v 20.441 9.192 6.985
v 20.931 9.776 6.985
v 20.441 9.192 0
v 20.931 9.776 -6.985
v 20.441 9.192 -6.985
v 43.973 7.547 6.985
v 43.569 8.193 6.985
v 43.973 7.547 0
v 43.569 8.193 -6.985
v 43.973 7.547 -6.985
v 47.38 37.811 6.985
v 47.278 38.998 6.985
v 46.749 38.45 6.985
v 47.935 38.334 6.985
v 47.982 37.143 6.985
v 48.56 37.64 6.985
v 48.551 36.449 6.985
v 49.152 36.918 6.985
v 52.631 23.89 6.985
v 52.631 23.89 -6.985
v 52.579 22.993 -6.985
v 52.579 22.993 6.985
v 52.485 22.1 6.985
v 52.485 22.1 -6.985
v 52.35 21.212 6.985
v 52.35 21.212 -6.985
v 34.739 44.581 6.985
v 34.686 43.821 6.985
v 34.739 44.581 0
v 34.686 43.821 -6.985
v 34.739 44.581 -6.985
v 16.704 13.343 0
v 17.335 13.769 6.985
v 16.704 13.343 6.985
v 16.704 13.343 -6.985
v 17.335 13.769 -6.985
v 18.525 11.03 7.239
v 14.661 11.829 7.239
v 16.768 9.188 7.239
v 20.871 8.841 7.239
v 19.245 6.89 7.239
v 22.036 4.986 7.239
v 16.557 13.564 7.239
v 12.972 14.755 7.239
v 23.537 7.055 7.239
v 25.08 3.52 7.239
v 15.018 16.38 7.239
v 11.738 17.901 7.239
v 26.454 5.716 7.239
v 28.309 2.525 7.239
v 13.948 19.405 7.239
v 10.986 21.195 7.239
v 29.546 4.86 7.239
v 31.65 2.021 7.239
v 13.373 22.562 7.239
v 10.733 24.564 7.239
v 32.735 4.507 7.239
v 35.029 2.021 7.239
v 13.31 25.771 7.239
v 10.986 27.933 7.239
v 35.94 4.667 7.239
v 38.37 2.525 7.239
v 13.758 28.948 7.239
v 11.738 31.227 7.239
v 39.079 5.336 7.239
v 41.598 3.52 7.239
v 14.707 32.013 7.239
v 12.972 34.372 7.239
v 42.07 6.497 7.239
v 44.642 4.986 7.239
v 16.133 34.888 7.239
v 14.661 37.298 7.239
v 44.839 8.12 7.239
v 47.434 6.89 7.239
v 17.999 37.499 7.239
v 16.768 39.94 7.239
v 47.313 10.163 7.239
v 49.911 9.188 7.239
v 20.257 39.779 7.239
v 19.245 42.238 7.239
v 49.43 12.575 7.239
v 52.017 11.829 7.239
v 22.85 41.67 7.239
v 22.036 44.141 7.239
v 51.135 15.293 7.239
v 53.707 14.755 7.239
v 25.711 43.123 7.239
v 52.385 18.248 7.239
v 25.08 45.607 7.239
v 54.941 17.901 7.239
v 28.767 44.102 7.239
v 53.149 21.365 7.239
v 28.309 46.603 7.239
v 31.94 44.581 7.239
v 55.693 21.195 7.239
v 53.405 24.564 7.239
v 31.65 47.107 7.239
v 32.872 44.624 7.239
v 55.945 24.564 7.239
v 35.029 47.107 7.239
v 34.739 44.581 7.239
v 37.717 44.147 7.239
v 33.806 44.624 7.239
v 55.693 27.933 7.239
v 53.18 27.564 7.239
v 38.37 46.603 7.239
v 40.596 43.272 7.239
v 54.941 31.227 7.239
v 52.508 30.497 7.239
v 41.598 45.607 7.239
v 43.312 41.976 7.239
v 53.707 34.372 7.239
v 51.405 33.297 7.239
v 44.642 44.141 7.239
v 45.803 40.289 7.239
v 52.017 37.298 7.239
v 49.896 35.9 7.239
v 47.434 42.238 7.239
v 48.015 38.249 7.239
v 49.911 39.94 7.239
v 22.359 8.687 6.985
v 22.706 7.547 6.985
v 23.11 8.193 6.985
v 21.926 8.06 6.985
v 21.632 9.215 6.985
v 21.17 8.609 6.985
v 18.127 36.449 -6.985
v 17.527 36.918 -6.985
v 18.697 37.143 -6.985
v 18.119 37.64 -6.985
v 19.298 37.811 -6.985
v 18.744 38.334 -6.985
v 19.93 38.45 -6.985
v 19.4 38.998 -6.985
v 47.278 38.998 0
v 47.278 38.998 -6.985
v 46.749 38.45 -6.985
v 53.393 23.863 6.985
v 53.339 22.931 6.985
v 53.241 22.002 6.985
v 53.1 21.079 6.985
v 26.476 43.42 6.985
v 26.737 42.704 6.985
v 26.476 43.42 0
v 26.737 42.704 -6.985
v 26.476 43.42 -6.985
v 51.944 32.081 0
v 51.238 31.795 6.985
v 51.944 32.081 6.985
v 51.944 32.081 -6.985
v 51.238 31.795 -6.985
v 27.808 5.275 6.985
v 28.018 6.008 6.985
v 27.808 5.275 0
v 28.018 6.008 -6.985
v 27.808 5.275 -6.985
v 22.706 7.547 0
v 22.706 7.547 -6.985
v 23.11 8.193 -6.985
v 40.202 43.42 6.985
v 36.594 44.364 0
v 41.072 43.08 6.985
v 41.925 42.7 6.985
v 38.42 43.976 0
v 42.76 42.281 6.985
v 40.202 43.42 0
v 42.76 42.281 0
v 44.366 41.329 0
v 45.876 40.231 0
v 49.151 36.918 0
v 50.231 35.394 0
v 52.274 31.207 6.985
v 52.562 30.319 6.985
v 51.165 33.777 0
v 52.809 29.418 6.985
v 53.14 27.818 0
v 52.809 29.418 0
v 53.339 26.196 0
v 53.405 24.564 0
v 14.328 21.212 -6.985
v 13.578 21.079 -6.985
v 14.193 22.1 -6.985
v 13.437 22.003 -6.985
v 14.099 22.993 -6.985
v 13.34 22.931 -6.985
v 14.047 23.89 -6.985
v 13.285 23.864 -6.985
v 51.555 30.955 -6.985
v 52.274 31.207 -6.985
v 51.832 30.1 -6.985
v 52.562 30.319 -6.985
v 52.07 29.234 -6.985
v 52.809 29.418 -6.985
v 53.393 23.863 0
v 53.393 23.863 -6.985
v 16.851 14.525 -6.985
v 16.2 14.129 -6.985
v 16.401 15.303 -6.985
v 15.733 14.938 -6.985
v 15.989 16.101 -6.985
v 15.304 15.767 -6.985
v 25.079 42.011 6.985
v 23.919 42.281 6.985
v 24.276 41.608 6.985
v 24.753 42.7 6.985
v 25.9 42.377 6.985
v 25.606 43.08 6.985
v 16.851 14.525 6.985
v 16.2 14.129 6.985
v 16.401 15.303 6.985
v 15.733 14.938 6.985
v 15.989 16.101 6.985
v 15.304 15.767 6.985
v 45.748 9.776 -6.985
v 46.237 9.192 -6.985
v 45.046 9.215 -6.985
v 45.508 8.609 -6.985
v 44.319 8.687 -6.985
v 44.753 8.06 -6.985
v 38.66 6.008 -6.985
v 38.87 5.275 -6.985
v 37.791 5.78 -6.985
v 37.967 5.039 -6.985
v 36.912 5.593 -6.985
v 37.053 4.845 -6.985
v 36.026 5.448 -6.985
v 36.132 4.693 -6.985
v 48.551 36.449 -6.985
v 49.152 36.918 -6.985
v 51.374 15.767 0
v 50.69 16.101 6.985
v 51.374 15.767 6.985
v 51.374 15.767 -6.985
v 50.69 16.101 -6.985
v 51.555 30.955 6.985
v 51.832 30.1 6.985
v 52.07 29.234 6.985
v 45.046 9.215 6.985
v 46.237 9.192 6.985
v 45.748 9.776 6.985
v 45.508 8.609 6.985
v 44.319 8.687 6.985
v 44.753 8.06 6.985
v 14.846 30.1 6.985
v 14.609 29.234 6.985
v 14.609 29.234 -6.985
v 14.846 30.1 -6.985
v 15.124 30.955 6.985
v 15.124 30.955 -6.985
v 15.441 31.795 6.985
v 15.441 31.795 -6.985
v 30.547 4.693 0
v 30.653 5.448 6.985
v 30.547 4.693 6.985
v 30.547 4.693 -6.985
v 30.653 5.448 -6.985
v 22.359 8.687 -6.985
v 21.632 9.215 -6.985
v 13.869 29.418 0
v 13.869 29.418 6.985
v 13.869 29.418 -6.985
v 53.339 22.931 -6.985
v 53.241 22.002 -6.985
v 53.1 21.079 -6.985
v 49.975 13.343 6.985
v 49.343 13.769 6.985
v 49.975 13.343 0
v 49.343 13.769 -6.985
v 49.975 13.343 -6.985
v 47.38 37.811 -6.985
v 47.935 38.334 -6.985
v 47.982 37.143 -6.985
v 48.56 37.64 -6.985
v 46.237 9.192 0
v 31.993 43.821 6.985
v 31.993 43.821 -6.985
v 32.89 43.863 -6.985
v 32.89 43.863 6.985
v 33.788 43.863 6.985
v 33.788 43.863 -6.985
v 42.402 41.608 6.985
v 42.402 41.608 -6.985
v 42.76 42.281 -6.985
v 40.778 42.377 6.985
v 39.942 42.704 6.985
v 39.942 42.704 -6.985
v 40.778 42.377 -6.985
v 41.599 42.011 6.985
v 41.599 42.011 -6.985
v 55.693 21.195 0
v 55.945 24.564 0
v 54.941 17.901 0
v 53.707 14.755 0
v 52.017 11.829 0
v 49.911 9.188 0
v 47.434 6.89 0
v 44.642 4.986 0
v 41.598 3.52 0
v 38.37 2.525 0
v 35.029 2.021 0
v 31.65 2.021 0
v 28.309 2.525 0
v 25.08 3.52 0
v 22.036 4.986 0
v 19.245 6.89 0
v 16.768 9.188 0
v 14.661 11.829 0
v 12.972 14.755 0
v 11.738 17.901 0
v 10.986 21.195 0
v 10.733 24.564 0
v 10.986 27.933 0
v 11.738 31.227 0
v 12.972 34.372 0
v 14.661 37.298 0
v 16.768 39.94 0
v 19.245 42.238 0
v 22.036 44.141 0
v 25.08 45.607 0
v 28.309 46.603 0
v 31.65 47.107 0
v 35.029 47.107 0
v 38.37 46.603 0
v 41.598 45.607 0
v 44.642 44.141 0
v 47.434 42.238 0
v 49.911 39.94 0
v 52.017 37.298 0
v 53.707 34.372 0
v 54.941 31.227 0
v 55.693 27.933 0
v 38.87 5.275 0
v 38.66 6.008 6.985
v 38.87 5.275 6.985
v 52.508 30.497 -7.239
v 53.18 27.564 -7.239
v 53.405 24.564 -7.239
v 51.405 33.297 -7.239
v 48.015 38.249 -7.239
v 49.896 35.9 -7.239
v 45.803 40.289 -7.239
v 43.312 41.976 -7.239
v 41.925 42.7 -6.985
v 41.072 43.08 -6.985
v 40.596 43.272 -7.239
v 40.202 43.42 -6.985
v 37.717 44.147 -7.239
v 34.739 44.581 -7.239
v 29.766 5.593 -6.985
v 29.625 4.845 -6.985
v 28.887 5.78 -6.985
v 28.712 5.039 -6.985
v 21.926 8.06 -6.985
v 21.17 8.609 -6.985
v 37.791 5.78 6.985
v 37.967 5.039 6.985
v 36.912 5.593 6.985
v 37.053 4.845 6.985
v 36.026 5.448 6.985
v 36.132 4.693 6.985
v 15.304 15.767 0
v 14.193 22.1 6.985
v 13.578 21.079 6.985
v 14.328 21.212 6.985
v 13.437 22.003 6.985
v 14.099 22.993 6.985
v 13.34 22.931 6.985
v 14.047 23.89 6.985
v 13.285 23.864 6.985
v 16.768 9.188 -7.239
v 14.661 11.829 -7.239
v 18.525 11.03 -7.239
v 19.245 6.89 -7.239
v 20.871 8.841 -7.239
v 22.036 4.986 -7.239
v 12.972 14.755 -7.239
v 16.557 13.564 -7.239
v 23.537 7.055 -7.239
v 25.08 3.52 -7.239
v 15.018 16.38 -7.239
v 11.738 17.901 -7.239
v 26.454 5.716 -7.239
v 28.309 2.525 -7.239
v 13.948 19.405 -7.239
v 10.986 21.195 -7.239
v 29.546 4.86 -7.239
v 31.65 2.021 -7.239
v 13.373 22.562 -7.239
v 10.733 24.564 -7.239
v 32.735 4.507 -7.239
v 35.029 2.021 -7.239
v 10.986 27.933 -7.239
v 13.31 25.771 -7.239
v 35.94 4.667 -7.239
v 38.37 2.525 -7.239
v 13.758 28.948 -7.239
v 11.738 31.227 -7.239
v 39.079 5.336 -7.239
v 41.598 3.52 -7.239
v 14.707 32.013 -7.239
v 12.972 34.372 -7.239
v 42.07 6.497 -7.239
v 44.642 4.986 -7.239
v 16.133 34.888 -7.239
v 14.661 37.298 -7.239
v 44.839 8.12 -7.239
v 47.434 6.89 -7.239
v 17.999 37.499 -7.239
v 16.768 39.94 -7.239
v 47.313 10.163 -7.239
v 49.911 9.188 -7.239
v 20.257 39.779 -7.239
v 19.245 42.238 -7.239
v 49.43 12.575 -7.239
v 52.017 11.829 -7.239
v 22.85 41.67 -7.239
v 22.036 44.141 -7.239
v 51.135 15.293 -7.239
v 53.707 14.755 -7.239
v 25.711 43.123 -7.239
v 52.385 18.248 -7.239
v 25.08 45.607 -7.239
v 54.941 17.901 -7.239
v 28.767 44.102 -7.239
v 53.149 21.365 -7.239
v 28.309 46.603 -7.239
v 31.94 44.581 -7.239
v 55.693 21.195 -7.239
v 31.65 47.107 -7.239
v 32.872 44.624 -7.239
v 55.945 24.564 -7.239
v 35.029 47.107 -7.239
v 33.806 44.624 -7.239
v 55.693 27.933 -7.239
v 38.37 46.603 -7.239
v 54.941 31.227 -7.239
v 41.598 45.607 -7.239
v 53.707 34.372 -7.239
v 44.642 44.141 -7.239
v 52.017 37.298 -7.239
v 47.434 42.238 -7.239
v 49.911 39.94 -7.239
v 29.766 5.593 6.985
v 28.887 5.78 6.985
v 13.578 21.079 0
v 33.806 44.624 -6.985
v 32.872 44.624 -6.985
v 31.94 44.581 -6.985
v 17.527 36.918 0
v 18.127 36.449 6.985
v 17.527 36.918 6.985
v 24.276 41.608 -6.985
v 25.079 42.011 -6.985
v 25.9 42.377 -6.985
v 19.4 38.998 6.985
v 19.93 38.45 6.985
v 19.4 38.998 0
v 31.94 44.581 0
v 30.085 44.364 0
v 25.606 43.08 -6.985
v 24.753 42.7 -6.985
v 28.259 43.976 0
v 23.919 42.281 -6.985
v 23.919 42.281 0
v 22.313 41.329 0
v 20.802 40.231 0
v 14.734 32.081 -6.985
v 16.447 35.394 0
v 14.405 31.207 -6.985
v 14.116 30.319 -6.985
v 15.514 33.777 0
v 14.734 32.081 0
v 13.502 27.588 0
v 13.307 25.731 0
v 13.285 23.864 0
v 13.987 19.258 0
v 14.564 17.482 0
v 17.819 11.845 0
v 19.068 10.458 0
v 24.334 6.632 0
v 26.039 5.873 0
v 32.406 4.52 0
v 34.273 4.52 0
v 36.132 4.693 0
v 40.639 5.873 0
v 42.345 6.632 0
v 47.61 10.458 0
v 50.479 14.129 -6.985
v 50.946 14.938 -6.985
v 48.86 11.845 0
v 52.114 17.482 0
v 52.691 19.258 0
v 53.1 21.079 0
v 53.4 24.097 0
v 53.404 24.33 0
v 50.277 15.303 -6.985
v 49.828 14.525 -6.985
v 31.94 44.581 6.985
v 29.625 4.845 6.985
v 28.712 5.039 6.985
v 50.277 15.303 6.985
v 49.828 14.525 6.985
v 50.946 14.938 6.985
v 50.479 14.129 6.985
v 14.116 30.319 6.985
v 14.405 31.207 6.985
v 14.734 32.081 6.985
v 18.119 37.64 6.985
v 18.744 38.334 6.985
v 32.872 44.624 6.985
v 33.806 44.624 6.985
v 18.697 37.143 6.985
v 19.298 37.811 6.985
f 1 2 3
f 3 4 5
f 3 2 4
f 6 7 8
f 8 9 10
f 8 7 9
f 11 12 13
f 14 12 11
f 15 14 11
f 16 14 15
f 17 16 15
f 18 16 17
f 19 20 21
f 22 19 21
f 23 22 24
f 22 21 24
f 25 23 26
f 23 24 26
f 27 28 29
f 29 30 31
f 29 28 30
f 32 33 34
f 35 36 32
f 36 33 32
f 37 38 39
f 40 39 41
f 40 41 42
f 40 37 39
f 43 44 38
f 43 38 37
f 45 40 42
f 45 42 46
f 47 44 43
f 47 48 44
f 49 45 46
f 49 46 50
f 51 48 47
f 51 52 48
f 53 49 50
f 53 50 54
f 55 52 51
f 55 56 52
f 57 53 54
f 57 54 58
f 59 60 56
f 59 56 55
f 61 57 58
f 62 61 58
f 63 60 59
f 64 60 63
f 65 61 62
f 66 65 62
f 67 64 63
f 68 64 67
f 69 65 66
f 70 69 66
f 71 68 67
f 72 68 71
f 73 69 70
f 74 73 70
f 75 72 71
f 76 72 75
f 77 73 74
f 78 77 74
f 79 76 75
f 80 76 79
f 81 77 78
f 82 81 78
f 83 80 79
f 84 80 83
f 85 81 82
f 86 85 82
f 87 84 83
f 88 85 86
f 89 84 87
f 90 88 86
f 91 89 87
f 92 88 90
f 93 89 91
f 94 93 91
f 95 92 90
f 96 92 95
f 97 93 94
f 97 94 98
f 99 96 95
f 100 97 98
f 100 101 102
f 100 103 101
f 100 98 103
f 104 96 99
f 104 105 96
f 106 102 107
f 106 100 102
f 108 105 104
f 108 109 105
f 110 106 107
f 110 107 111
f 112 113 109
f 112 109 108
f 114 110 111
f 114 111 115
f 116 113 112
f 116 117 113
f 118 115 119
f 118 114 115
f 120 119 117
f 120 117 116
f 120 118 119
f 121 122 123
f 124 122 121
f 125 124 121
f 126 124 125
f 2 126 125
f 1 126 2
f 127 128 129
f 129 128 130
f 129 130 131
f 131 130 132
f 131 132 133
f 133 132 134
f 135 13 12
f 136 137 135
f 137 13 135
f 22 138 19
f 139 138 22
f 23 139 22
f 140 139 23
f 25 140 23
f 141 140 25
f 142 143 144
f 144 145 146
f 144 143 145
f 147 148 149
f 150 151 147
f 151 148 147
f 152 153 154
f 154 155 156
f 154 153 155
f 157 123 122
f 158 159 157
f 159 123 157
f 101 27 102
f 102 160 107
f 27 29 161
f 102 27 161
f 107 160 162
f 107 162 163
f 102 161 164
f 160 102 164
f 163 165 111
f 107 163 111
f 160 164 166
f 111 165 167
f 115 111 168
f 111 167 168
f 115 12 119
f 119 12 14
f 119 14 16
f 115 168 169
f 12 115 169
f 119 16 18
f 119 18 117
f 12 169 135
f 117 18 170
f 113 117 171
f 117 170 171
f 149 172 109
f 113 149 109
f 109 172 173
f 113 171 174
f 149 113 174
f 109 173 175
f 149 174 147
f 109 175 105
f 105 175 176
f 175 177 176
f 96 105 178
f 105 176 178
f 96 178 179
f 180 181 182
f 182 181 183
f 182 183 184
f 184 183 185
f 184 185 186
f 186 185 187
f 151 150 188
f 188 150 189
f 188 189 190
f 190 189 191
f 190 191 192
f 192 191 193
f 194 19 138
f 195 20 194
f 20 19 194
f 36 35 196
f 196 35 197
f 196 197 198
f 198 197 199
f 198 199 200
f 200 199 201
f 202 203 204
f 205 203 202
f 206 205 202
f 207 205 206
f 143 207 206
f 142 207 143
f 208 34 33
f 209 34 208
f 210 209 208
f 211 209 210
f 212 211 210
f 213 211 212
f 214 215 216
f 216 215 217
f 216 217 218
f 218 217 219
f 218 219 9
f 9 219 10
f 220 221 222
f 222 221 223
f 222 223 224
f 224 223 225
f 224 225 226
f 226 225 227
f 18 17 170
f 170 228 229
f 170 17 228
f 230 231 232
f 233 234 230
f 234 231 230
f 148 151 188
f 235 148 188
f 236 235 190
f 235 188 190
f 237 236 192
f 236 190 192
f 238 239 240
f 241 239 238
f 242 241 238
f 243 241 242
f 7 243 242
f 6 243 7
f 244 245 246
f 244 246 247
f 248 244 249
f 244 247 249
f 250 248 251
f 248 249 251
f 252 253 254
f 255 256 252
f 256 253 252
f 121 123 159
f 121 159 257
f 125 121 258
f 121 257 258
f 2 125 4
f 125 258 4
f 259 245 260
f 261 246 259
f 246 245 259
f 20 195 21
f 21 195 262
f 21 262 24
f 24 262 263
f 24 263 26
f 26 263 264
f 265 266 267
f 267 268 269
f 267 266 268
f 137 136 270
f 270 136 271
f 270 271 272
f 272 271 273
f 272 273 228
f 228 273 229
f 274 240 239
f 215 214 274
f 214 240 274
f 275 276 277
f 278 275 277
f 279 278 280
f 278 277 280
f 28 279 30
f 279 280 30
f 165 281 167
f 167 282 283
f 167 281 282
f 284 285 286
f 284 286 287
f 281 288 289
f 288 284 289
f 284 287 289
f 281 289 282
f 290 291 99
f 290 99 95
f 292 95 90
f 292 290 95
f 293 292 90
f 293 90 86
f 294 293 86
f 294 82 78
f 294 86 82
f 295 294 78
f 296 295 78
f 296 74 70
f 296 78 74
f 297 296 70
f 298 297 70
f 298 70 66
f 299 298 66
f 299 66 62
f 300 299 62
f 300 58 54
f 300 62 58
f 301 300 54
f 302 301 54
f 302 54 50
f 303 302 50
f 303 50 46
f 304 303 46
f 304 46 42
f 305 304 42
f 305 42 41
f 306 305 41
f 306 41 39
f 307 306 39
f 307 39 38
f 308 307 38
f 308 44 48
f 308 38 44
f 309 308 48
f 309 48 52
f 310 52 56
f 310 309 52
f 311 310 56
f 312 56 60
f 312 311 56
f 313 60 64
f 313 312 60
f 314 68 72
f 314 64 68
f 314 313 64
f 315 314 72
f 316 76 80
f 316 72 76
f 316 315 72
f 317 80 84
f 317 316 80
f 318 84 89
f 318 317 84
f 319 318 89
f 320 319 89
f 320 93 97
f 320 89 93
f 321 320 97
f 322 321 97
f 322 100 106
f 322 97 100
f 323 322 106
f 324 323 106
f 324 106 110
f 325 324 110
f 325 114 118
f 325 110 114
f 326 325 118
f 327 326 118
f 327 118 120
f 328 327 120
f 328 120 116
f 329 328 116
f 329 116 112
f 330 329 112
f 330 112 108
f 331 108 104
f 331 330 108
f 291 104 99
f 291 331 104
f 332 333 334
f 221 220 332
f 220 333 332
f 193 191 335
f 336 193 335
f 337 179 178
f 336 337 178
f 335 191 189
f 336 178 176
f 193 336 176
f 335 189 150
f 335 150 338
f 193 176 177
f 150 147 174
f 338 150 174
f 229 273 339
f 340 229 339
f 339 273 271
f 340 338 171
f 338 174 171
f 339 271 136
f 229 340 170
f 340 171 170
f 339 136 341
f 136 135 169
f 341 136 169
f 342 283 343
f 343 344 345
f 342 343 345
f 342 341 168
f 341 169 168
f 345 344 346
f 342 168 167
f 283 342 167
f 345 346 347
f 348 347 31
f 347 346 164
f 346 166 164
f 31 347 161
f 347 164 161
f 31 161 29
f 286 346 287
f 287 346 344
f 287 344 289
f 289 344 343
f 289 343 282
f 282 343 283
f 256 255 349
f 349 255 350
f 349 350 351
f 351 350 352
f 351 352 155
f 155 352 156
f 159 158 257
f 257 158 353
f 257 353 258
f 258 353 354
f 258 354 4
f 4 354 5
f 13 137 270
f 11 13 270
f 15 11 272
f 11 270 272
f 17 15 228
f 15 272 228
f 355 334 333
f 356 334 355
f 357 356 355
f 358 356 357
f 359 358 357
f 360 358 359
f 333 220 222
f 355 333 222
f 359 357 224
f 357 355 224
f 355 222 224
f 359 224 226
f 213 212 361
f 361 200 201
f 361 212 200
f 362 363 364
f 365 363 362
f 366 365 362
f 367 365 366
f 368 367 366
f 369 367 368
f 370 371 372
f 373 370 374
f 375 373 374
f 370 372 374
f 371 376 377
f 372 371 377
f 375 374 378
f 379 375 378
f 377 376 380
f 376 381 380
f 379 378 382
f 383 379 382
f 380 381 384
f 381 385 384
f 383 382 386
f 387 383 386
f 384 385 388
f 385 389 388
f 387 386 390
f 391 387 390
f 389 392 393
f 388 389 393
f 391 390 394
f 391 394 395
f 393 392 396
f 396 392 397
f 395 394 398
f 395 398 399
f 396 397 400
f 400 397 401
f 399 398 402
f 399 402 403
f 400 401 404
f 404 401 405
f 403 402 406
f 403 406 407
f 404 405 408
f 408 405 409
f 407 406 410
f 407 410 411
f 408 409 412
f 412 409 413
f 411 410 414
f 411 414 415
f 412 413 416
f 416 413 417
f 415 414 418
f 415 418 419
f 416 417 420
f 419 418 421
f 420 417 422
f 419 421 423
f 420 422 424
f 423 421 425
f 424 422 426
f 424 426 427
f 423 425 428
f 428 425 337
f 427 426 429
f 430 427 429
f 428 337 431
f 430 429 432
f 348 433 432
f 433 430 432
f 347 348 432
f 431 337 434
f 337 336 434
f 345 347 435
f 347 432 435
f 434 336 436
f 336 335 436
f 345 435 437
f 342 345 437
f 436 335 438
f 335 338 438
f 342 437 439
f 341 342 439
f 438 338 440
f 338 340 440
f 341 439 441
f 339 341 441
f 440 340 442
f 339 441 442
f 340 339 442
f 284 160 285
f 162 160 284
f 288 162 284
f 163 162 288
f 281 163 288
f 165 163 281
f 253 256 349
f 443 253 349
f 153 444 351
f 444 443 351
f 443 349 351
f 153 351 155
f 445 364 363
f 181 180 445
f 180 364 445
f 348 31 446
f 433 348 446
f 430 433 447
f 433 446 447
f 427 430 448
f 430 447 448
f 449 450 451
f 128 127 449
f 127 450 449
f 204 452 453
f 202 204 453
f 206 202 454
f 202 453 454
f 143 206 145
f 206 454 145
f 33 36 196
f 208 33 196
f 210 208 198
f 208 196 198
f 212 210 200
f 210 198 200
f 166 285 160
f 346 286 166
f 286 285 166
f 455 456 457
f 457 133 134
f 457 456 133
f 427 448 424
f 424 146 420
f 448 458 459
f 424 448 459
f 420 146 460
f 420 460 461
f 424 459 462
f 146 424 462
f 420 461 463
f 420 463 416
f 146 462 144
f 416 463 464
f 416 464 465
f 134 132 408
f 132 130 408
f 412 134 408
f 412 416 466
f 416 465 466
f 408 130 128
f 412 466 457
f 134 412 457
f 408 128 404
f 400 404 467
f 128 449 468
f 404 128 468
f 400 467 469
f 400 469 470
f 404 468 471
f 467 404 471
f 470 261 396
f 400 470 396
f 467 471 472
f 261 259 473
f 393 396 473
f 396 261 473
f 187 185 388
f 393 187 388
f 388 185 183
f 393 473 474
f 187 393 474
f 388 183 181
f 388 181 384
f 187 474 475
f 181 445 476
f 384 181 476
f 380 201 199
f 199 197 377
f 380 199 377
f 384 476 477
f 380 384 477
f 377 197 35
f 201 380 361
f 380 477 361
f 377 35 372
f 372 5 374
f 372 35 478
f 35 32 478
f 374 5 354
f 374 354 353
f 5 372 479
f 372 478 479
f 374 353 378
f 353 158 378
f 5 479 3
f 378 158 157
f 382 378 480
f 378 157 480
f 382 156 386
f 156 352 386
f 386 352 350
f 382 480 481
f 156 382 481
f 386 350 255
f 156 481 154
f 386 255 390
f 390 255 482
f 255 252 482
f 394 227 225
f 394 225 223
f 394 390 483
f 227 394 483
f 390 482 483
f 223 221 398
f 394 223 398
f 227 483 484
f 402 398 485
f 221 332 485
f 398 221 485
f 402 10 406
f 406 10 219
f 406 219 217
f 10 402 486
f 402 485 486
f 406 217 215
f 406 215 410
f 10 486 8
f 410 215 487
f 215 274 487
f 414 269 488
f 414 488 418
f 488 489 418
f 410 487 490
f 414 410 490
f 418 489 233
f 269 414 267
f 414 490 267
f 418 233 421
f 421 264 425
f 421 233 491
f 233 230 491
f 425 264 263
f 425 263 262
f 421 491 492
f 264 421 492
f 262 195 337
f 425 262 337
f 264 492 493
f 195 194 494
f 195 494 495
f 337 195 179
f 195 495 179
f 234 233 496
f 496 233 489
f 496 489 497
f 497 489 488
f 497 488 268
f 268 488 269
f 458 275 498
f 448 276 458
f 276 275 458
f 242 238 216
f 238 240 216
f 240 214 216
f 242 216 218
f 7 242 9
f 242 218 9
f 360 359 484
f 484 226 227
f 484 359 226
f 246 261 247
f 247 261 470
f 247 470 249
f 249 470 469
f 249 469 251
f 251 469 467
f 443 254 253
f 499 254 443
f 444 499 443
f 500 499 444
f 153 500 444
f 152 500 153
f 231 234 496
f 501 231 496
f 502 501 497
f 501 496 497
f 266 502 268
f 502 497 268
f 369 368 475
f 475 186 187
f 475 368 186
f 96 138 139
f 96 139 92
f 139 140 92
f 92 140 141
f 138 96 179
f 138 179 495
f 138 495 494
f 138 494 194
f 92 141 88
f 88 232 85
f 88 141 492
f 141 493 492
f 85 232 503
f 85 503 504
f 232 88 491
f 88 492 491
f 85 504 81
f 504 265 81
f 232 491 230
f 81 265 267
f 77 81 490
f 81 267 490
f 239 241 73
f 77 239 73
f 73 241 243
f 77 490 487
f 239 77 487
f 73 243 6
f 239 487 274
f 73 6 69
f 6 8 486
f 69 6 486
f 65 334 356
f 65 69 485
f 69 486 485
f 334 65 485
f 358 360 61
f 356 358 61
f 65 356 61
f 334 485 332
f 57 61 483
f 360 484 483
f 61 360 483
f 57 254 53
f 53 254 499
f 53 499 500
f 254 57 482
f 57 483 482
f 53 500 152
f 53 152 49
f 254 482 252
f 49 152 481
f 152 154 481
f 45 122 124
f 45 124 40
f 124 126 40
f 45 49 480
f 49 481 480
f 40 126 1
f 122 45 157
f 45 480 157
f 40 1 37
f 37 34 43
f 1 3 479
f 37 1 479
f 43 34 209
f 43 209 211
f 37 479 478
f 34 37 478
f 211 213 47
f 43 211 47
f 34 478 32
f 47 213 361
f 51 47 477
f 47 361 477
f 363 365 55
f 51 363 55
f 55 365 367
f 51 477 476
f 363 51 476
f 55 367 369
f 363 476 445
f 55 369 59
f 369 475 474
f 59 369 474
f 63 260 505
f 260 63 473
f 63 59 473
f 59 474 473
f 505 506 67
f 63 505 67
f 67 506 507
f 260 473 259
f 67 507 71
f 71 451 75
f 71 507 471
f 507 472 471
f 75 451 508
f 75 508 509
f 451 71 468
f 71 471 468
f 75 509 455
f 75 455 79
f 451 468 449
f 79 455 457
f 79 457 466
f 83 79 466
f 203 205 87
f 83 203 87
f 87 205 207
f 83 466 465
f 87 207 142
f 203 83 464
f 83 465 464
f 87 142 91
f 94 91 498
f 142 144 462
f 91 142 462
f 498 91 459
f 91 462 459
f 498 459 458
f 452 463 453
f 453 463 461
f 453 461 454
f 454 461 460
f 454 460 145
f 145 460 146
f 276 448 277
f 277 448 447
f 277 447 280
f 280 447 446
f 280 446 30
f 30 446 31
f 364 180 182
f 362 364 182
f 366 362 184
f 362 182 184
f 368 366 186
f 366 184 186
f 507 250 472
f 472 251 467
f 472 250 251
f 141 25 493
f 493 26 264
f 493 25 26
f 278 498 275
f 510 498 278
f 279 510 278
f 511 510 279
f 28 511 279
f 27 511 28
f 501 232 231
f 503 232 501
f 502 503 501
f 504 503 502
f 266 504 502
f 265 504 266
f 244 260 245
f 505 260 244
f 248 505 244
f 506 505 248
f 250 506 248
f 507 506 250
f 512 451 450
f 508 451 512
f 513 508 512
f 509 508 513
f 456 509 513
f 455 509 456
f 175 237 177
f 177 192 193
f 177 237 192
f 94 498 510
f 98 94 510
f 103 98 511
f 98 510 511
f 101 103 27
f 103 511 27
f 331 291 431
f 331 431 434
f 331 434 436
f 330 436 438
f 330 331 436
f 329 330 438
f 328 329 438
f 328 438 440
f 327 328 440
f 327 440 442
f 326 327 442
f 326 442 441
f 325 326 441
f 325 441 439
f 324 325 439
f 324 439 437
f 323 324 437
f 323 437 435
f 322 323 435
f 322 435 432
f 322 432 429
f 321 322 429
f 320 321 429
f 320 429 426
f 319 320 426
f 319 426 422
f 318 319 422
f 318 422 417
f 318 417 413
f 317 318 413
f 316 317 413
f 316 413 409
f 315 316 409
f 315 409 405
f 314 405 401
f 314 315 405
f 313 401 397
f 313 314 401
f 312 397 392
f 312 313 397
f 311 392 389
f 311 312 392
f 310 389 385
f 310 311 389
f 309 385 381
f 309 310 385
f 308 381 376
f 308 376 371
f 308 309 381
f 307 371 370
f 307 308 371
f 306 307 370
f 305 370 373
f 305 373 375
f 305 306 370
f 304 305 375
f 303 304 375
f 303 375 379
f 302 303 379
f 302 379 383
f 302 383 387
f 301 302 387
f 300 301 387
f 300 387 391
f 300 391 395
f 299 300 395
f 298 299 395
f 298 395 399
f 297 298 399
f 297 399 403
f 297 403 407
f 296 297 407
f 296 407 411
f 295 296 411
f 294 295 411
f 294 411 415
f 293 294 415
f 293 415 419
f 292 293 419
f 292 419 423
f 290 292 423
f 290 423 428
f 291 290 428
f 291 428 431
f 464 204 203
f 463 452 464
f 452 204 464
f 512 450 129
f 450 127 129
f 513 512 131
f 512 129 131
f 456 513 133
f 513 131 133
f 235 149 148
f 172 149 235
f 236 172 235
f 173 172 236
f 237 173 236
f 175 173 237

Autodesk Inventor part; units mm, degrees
ref_plane "YZ Plane" through (0, 0, 0) normal (1, 0, 0) x (0, 1, 0)
ref_plane "XZ Plane" through (0, 0, 0) normal (0, 1, 0) x (-1, 0, 0)
ref_plane "XY Plane" through (0, 0, 0) normal (0, 0, 1) x (1, 0, 0)
sketch "Sketch1" plane through (0, 0, 0) normal (0, 0, 1) x (1, 0, 0)
  arc A0 (34.6858, 43.8208) -> (31.9926, 43.8208) centre (33.3392, 24.5638) ccw
  circle A1 centre (33.3392, 24.5638) radius 20.066
  circle A2 centre (33.3392, 24.5638) radius 22.606
  line L0 (34.6858, 43.8208) -> (34.739, 44.581)
  line L1 (31.9926, 43.8208) -> (31.9395, 44.581)
  point P0 (0, 0)
  dimension "d0" = 38.608
  dimension "d3" = 0.762
  dimension "d4" = 2.54
extrude "Extrusion2" add sketch "Sketch1" along normal mid plane 14.478
extrude "Extrusion3" add sketch "Sketch1" along normal mid plane 13.97 contours A0 L1 A1 L0 picked at (34.4103, 44.3421)
pattern_circular "Circular Pattern1" count 15 over 360 about axis through (33.3392, 24.5638, 0) along (0, 0, 1) of "Extrusion3"
properties part number "Automoblox TireTL"
